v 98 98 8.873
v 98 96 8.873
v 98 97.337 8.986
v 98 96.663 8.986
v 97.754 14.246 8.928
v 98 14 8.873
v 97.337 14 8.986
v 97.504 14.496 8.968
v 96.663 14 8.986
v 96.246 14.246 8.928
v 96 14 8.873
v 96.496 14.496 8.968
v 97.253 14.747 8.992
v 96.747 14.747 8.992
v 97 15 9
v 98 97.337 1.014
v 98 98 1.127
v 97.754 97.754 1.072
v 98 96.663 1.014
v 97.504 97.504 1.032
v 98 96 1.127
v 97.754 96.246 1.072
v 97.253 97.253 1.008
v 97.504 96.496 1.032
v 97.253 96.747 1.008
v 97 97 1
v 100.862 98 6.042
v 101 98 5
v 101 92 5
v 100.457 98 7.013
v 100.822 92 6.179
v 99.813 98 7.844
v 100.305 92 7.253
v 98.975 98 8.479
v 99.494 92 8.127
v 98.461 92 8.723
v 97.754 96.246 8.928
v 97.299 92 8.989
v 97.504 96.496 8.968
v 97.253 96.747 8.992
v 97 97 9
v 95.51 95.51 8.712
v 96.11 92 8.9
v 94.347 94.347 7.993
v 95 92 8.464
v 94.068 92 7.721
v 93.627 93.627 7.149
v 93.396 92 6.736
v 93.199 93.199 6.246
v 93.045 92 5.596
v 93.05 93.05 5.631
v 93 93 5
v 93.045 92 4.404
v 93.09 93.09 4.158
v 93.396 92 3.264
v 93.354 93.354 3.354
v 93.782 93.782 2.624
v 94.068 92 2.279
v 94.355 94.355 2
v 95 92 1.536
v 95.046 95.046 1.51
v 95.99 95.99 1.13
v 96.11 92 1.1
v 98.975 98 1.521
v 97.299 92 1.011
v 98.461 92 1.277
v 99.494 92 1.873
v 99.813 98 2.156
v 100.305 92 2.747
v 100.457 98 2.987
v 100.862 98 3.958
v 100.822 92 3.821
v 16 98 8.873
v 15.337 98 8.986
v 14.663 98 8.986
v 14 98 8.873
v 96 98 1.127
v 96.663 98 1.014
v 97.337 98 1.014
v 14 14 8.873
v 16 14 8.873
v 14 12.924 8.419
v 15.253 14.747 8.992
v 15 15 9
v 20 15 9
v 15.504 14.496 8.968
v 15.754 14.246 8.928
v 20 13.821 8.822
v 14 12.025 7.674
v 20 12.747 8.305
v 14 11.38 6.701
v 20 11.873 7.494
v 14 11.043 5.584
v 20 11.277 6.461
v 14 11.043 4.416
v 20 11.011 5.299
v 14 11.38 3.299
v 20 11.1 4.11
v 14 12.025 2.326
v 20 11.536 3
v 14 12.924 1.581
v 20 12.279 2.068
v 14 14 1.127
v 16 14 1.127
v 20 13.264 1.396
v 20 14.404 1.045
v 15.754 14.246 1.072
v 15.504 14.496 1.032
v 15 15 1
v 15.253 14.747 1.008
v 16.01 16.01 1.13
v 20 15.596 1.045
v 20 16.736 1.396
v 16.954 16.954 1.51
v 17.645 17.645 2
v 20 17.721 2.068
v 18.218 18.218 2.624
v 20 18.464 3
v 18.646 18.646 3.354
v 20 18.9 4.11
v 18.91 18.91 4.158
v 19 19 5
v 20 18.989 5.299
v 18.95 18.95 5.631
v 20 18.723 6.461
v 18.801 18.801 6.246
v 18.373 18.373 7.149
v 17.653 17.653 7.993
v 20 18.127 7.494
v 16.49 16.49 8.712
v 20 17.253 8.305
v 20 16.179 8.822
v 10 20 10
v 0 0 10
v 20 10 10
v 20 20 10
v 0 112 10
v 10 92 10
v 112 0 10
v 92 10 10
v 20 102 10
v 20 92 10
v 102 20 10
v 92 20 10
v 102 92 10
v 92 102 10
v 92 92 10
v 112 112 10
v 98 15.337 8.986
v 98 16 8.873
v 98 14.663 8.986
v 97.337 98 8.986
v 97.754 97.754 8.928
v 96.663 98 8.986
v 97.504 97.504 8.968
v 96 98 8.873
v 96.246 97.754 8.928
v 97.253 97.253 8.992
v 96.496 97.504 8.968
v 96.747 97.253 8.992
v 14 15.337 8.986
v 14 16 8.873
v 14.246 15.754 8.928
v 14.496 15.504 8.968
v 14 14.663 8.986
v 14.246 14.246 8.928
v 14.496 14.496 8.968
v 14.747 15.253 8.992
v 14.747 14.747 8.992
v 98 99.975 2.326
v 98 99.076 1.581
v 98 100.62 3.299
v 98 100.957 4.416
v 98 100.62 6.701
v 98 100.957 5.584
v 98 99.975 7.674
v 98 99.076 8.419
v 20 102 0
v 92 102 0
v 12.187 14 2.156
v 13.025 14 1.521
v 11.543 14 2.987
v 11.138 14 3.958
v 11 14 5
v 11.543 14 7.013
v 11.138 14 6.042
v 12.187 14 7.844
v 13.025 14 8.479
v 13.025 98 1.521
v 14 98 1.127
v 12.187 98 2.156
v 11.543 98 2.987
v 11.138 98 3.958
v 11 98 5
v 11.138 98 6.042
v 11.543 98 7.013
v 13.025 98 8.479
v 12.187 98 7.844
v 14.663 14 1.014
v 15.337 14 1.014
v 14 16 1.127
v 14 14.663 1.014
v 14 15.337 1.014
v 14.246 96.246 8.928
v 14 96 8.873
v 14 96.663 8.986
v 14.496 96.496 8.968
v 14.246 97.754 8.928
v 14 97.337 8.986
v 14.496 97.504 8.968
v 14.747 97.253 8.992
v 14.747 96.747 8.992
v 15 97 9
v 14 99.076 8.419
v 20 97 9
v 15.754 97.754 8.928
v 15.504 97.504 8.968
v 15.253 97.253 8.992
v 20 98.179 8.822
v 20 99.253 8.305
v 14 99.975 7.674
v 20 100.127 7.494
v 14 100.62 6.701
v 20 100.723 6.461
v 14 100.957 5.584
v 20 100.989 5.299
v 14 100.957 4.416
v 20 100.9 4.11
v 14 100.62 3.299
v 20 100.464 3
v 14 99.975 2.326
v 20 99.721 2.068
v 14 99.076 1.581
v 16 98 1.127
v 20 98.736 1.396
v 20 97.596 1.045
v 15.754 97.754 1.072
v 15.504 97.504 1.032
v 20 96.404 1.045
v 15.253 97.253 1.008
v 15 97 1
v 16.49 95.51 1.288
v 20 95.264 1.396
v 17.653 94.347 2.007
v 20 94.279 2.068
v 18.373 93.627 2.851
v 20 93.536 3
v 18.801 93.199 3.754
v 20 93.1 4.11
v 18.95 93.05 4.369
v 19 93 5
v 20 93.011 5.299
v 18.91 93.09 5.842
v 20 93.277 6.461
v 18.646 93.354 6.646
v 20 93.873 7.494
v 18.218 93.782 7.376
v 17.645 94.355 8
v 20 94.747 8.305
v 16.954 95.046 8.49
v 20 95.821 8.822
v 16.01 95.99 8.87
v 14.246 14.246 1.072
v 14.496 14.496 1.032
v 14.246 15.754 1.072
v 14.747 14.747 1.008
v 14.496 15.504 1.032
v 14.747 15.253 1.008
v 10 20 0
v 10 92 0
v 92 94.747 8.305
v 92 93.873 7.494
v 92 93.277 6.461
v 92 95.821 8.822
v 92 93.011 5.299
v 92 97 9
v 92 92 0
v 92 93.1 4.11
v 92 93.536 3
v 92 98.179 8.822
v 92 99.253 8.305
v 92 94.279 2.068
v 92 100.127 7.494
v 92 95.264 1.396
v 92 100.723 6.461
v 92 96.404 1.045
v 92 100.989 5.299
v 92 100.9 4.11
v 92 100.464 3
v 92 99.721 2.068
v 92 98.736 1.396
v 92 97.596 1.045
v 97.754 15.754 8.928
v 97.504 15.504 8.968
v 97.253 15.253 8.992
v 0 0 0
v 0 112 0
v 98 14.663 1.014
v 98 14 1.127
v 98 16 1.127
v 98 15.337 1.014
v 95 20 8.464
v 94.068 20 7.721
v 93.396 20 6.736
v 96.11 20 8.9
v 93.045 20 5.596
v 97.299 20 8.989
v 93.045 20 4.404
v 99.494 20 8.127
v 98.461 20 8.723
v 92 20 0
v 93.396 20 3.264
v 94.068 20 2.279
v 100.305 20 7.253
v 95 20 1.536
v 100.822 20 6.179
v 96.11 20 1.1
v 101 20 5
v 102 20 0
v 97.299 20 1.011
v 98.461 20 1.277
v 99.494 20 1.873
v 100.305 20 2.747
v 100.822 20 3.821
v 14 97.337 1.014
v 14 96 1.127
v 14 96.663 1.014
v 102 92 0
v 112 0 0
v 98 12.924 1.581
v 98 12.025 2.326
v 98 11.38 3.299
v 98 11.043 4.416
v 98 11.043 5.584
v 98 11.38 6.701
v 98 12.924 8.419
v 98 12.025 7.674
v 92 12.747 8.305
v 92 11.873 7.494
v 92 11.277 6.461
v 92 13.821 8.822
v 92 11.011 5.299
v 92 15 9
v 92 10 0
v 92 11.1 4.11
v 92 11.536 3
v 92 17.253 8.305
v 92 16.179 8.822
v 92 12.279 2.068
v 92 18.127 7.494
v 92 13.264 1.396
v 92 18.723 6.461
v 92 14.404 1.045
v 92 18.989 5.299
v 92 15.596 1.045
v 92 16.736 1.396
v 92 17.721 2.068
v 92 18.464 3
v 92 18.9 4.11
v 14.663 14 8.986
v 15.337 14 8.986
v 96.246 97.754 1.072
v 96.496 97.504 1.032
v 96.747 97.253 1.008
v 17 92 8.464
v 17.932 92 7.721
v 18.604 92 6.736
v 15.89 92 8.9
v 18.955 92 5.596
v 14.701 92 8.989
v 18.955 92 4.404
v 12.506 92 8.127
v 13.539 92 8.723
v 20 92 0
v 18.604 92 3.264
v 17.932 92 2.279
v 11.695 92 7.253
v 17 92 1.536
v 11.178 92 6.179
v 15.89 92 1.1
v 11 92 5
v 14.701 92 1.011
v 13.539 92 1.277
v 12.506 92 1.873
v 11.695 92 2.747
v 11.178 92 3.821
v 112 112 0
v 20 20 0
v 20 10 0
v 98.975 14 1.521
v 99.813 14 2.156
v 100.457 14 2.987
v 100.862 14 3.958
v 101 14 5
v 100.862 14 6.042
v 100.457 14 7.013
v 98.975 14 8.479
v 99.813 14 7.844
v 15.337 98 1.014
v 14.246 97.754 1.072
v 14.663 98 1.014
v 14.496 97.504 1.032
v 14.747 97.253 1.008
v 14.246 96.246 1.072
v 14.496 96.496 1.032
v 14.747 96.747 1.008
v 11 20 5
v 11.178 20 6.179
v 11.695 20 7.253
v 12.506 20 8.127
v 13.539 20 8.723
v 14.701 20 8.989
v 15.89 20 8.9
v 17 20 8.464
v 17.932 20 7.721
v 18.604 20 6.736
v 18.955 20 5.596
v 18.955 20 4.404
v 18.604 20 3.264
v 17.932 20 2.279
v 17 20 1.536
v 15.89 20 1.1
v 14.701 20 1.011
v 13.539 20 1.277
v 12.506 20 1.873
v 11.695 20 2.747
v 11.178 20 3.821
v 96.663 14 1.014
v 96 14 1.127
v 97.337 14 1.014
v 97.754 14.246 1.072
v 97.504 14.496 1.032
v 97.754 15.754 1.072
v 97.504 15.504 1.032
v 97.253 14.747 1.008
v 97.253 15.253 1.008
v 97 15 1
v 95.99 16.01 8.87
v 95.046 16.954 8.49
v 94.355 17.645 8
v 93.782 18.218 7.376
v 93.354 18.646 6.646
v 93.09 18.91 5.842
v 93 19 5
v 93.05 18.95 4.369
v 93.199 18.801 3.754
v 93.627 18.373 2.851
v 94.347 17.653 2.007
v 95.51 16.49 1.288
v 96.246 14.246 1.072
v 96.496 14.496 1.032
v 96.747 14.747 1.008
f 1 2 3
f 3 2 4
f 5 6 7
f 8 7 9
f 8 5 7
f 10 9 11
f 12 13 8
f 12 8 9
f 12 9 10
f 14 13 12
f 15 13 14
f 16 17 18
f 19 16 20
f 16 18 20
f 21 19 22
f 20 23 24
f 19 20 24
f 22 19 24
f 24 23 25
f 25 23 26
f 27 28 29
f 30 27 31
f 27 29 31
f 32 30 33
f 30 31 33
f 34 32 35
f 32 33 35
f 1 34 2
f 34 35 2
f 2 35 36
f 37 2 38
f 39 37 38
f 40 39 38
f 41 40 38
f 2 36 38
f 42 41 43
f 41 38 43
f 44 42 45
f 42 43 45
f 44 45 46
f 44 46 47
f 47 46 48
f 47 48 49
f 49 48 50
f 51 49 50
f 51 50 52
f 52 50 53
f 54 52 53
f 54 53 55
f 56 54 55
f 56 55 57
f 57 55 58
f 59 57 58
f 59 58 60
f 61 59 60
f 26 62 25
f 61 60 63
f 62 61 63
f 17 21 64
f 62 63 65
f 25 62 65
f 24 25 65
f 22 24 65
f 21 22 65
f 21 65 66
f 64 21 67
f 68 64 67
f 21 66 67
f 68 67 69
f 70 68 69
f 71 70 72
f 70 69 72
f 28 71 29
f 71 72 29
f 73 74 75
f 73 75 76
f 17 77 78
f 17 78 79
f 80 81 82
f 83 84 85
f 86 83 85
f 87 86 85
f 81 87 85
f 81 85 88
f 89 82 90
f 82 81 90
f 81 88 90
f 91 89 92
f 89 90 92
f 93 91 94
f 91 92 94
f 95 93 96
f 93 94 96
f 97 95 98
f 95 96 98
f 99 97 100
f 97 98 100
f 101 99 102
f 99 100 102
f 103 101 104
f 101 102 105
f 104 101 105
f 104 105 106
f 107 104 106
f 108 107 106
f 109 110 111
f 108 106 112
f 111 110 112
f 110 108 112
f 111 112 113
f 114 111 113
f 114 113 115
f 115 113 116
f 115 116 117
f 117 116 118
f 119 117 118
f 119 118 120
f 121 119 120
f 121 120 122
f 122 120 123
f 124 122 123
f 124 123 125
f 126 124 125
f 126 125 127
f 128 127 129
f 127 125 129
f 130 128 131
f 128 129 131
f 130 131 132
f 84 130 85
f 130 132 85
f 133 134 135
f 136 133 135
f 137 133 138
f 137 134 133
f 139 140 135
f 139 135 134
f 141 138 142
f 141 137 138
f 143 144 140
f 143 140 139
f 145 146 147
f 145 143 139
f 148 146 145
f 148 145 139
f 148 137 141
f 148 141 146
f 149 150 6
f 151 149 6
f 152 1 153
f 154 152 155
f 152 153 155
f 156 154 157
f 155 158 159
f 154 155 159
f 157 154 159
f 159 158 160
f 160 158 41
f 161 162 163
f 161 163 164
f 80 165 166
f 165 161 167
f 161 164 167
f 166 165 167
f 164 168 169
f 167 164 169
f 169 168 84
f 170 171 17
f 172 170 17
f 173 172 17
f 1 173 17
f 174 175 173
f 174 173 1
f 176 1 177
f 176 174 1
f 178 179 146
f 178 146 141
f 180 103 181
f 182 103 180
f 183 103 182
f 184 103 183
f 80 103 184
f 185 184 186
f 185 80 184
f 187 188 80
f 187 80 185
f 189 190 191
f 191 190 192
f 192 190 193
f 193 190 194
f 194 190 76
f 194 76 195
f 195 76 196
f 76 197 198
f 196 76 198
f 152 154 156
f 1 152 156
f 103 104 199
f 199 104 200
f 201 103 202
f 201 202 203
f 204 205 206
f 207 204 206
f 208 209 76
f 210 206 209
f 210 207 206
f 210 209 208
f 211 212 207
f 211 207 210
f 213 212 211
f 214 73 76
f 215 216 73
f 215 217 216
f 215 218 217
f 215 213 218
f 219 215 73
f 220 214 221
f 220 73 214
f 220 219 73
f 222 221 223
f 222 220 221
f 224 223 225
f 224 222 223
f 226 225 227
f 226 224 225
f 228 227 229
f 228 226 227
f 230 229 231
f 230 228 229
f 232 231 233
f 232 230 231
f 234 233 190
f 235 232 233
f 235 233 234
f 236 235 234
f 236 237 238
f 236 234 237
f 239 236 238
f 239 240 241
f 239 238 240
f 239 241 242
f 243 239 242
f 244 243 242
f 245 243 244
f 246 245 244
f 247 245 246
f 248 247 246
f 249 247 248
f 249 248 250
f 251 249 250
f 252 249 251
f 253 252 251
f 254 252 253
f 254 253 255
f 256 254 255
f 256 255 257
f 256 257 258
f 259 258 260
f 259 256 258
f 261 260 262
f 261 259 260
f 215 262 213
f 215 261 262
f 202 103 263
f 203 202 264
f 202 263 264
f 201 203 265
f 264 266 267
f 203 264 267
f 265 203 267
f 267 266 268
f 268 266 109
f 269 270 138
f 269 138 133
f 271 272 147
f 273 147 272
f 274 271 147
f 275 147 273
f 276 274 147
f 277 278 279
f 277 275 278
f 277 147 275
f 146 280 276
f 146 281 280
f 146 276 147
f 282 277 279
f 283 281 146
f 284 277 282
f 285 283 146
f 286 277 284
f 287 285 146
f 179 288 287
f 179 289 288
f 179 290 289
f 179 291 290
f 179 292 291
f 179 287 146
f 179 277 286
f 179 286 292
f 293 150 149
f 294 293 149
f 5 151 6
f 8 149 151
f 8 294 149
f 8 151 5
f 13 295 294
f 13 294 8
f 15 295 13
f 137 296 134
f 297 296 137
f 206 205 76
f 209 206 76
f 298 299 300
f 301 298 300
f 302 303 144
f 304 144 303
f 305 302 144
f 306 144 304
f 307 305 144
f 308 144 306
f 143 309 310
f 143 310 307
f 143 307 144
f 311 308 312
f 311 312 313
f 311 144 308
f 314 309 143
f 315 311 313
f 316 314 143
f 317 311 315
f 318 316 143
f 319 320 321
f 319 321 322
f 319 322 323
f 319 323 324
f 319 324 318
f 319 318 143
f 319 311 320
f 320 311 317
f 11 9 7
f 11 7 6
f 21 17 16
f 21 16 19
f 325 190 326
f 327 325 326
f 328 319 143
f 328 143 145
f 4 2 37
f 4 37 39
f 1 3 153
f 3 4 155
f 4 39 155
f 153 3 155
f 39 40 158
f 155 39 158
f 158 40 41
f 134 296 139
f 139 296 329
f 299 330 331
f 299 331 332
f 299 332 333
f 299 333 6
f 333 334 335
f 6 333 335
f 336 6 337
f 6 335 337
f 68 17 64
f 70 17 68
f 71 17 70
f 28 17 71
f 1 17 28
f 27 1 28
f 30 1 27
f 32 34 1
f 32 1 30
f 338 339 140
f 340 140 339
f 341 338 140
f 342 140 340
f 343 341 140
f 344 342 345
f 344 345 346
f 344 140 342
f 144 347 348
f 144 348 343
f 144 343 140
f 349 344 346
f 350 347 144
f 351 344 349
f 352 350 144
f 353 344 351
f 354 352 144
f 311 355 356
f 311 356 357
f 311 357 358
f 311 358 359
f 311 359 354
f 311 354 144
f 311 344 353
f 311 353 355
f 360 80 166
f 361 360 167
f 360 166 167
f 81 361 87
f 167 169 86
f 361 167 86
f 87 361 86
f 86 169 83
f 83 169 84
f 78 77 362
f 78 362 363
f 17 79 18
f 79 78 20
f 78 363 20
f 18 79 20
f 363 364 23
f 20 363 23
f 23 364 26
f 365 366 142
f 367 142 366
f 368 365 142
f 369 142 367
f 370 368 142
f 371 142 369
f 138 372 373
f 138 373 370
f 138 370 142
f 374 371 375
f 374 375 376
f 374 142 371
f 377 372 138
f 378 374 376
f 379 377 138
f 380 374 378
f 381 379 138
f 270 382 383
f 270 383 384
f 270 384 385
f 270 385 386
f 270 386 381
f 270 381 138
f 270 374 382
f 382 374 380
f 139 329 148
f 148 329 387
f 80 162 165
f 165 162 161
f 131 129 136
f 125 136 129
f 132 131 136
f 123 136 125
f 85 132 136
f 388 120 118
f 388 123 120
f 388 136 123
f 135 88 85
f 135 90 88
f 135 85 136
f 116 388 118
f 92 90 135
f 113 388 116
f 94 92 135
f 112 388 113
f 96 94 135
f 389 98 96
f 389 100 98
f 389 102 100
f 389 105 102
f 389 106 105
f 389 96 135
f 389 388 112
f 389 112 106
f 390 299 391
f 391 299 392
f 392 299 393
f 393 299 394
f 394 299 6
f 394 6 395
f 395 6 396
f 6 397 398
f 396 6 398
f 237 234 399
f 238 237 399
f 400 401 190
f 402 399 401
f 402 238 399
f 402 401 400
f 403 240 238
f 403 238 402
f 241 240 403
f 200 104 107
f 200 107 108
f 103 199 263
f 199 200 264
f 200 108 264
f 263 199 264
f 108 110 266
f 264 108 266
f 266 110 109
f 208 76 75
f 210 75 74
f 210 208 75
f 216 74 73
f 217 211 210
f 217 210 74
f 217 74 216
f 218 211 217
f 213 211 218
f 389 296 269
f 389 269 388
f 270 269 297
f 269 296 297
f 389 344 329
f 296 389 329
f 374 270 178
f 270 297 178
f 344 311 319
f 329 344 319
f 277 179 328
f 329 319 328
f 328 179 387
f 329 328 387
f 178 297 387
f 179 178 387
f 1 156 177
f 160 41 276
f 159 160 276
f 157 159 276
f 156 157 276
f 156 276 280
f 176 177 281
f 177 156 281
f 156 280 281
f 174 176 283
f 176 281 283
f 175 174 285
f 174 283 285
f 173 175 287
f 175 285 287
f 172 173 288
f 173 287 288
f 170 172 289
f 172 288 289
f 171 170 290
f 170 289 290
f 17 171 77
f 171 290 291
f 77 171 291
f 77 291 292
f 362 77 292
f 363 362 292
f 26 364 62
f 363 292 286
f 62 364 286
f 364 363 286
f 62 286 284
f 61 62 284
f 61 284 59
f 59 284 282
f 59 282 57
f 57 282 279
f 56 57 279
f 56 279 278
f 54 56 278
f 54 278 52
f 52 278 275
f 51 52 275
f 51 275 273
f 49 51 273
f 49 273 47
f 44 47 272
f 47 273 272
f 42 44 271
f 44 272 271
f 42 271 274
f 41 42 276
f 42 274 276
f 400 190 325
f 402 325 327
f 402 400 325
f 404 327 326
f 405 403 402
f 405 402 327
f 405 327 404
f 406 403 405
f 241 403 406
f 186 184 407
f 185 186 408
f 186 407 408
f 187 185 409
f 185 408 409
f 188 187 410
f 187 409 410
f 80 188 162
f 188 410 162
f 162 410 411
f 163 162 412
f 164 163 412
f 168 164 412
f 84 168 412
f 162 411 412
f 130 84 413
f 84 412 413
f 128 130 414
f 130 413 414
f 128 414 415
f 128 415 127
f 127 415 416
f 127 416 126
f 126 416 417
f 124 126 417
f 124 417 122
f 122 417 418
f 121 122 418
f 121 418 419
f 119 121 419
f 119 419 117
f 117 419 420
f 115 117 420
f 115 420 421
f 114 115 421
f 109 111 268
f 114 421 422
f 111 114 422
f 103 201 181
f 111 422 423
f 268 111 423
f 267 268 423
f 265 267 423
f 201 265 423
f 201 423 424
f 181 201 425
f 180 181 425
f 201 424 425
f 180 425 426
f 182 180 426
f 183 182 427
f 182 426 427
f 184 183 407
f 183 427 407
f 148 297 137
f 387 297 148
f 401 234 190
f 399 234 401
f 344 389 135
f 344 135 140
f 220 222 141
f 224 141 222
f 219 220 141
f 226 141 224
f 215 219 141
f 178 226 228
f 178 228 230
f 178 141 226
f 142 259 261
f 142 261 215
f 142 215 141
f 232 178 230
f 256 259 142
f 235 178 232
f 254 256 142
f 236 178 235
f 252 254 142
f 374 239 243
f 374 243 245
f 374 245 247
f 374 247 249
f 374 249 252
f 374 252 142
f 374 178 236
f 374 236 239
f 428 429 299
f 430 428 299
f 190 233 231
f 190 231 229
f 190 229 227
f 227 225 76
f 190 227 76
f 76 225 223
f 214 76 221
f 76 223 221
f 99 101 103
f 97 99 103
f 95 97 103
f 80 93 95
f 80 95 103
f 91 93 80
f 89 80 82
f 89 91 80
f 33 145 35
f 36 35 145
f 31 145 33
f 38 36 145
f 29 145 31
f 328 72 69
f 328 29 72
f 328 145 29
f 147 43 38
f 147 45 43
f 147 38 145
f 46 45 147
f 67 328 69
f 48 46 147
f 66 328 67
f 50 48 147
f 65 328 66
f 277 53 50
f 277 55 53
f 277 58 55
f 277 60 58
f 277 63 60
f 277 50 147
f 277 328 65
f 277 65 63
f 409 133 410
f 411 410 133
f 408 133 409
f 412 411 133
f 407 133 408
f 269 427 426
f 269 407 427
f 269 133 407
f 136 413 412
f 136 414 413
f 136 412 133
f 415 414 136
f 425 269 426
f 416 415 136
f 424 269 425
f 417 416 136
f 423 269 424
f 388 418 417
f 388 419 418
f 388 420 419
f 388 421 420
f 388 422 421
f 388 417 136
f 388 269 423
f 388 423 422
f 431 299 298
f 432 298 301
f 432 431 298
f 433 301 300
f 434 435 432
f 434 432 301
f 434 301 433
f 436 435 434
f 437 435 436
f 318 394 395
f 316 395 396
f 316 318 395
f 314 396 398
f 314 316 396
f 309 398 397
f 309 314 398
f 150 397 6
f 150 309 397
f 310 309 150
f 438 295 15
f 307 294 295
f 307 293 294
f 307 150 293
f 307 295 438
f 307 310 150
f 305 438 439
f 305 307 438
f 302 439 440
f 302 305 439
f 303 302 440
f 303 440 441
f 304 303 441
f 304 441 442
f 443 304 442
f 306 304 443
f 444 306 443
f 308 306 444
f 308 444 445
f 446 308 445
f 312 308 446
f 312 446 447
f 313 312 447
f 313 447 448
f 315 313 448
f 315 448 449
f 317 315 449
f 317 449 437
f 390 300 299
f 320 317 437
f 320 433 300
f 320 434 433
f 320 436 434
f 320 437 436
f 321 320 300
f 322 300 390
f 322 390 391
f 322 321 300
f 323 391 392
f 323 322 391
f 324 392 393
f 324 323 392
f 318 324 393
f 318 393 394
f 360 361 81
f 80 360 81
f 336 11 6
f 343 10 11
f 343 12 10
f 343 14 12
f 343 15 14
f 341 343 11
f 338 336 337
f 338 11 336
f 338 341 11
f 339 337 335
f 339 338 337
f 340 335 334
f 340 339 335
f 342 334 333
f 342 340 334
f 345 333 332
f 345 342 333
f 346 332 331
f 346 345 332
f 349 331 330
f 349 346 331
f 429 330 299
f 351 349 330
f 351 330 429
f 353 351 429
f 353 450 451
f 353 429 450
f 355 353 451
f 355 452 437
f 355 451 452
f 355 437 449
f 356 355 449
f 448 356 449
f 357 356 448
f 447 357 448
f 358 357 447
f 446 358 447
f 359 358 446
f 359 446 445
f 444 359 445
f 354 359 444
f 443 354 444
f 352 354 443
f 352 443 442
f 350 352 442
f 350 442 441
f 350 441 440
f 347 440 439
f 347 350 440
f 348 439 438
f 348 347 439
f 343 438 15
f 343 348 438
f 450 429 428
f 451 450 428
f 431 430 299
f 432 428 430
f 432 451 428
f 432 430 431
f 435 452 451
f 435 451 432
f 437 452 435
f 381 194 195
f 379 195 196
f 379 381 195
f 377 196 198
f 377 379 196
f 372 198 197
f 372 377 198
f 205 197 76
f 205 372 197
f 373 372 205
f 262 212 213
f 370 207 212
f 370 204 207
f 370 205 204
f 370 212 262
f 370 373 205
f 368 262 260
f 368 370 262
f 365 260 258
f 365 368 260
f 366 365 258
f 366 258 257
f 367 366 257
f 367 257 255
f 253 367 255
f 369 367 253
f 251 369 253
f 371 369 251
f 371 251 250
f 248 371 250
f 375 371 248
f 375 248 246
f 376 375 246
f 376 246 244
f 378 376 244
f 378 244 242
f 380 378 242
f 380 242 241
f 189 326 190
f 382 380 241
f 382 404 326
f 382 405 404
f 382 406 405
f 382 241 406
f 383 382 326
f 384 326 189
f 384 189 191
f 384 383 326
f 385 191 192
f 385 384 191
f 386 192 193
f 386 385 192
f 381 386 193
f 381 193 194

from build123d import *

# Parameters (mm, degrees)
CROQUIS1_W                = 112
CROQUIS1_H                = 112
SALIENTE_EXTRUIR1_DEPTH   = 10
CROQUIS2_R                = 4
CORTAR_EXTRUIR1_DEPTH     = 6
CROQUIS3_R                = 4
CORTAR_EXTRUIR2_DEPTH     = 6
SIMETR_A2_COPY_1_SKETCH_R = 4
SIMETR_A2_COPY_1_DEPTH    = 6
SIMETR_A2_COPY_2_SKETCH_R = 4
SIMETR_A2_COPY_2_DEPTH    = 6


with BuildPart() as part:
    # Croquis1 → Saliente-Extruir1 (new body)
    with BuildSketch(Plane.XY):
        with Locations((56, 56)):
            Rectangle(CROQUIS1_W, CROQUIS1_H)
        Polygon((20, 10), (92, 10), (92, 20), (102, 20), (102, 92), (92, 92), (92, 102), (20, 102), (20, 92), (10, 92), (10, 20), (20, 20), align=None, mode=Mode.SUBTRACT)
    extrude(amount=SALIENTE_EXTRUIR1_DEPTH)

    # Croquis2 → Cortar-Extruir1 (cut)
    with BuildSketch(Plane.XZ.offset(-92)):
        with Locations((97, 5)):
            Circle(CROQUIS2_R)
    cortar_extruir1 = extrude(amount=-CORTAR_EXTRUIR1_DEPTH, mode=Mode.SUBTRACT)

    # Croquis3 → Cortar-Extruir2 (cut)
    with BuildSketch(Plane.ZY.offset(-92)):
        with Locations((5, 97)):
            Circle(CROQUIS3_R)
    cortar_extruir2 = extrude(amount=-CORTAR_EXTRUIR2_DEPTH, mode=Mode.SUBTRACT)

    # Simetría1: Cortar-Extruir1, Cortar-Extruir2 across plane
    add(cortar_extruir1.mirror(Plane.ZY.offset(-56)), mode=Mode.SUBTRACT)
    add(cortar_extruir2.mirror(Plane.ZY.offset(-56)), mode=Mode.SUBTRACT)

    # Simetría2: Cortar-Extruir1, Cortar-Extruir2 across plane
    add(cortar_extruir1.mirror(Plane.ZX.offset(56)), mode=Mode.SUBTRACT)
    add(cortar_extruir2.mirror(Plane.ZX.offset(56)), mode=Mode.SUBTRACT)

    # Simetría2 copy 1 sketch → Simetría2 copy 1 (cut)
    with BuildSketch(Plane(origin=(112, 20, 0), x_dir=(-1, 0, 0), z_dir=(0, 1, 0))):
        with Locations((97, 5)):
            Circle(SIMETR_A2_COPY_1_SKETCH_R)
    extrude(amount=-SIMETR_A2_COPY_1_DEPTH, mode=Mode.SUBTRACT)

    # Simetría2 copy 2 sketch → Simetría2 copy 2 (cut)
    with BuildSketch(Plane(origin=(20, 112, 0), x_dir=(0, 0, 1), z_dir=(1, 0, 0))):
        with Locations((5, 97)):
            Circle(SIMETR_A2_COPY_2_SKETCH_R)
    extrude(amount=-SIMETR_A2_COPY_2_DEPTH, mode=Mode.SUBTRACT)


solid = part.part
